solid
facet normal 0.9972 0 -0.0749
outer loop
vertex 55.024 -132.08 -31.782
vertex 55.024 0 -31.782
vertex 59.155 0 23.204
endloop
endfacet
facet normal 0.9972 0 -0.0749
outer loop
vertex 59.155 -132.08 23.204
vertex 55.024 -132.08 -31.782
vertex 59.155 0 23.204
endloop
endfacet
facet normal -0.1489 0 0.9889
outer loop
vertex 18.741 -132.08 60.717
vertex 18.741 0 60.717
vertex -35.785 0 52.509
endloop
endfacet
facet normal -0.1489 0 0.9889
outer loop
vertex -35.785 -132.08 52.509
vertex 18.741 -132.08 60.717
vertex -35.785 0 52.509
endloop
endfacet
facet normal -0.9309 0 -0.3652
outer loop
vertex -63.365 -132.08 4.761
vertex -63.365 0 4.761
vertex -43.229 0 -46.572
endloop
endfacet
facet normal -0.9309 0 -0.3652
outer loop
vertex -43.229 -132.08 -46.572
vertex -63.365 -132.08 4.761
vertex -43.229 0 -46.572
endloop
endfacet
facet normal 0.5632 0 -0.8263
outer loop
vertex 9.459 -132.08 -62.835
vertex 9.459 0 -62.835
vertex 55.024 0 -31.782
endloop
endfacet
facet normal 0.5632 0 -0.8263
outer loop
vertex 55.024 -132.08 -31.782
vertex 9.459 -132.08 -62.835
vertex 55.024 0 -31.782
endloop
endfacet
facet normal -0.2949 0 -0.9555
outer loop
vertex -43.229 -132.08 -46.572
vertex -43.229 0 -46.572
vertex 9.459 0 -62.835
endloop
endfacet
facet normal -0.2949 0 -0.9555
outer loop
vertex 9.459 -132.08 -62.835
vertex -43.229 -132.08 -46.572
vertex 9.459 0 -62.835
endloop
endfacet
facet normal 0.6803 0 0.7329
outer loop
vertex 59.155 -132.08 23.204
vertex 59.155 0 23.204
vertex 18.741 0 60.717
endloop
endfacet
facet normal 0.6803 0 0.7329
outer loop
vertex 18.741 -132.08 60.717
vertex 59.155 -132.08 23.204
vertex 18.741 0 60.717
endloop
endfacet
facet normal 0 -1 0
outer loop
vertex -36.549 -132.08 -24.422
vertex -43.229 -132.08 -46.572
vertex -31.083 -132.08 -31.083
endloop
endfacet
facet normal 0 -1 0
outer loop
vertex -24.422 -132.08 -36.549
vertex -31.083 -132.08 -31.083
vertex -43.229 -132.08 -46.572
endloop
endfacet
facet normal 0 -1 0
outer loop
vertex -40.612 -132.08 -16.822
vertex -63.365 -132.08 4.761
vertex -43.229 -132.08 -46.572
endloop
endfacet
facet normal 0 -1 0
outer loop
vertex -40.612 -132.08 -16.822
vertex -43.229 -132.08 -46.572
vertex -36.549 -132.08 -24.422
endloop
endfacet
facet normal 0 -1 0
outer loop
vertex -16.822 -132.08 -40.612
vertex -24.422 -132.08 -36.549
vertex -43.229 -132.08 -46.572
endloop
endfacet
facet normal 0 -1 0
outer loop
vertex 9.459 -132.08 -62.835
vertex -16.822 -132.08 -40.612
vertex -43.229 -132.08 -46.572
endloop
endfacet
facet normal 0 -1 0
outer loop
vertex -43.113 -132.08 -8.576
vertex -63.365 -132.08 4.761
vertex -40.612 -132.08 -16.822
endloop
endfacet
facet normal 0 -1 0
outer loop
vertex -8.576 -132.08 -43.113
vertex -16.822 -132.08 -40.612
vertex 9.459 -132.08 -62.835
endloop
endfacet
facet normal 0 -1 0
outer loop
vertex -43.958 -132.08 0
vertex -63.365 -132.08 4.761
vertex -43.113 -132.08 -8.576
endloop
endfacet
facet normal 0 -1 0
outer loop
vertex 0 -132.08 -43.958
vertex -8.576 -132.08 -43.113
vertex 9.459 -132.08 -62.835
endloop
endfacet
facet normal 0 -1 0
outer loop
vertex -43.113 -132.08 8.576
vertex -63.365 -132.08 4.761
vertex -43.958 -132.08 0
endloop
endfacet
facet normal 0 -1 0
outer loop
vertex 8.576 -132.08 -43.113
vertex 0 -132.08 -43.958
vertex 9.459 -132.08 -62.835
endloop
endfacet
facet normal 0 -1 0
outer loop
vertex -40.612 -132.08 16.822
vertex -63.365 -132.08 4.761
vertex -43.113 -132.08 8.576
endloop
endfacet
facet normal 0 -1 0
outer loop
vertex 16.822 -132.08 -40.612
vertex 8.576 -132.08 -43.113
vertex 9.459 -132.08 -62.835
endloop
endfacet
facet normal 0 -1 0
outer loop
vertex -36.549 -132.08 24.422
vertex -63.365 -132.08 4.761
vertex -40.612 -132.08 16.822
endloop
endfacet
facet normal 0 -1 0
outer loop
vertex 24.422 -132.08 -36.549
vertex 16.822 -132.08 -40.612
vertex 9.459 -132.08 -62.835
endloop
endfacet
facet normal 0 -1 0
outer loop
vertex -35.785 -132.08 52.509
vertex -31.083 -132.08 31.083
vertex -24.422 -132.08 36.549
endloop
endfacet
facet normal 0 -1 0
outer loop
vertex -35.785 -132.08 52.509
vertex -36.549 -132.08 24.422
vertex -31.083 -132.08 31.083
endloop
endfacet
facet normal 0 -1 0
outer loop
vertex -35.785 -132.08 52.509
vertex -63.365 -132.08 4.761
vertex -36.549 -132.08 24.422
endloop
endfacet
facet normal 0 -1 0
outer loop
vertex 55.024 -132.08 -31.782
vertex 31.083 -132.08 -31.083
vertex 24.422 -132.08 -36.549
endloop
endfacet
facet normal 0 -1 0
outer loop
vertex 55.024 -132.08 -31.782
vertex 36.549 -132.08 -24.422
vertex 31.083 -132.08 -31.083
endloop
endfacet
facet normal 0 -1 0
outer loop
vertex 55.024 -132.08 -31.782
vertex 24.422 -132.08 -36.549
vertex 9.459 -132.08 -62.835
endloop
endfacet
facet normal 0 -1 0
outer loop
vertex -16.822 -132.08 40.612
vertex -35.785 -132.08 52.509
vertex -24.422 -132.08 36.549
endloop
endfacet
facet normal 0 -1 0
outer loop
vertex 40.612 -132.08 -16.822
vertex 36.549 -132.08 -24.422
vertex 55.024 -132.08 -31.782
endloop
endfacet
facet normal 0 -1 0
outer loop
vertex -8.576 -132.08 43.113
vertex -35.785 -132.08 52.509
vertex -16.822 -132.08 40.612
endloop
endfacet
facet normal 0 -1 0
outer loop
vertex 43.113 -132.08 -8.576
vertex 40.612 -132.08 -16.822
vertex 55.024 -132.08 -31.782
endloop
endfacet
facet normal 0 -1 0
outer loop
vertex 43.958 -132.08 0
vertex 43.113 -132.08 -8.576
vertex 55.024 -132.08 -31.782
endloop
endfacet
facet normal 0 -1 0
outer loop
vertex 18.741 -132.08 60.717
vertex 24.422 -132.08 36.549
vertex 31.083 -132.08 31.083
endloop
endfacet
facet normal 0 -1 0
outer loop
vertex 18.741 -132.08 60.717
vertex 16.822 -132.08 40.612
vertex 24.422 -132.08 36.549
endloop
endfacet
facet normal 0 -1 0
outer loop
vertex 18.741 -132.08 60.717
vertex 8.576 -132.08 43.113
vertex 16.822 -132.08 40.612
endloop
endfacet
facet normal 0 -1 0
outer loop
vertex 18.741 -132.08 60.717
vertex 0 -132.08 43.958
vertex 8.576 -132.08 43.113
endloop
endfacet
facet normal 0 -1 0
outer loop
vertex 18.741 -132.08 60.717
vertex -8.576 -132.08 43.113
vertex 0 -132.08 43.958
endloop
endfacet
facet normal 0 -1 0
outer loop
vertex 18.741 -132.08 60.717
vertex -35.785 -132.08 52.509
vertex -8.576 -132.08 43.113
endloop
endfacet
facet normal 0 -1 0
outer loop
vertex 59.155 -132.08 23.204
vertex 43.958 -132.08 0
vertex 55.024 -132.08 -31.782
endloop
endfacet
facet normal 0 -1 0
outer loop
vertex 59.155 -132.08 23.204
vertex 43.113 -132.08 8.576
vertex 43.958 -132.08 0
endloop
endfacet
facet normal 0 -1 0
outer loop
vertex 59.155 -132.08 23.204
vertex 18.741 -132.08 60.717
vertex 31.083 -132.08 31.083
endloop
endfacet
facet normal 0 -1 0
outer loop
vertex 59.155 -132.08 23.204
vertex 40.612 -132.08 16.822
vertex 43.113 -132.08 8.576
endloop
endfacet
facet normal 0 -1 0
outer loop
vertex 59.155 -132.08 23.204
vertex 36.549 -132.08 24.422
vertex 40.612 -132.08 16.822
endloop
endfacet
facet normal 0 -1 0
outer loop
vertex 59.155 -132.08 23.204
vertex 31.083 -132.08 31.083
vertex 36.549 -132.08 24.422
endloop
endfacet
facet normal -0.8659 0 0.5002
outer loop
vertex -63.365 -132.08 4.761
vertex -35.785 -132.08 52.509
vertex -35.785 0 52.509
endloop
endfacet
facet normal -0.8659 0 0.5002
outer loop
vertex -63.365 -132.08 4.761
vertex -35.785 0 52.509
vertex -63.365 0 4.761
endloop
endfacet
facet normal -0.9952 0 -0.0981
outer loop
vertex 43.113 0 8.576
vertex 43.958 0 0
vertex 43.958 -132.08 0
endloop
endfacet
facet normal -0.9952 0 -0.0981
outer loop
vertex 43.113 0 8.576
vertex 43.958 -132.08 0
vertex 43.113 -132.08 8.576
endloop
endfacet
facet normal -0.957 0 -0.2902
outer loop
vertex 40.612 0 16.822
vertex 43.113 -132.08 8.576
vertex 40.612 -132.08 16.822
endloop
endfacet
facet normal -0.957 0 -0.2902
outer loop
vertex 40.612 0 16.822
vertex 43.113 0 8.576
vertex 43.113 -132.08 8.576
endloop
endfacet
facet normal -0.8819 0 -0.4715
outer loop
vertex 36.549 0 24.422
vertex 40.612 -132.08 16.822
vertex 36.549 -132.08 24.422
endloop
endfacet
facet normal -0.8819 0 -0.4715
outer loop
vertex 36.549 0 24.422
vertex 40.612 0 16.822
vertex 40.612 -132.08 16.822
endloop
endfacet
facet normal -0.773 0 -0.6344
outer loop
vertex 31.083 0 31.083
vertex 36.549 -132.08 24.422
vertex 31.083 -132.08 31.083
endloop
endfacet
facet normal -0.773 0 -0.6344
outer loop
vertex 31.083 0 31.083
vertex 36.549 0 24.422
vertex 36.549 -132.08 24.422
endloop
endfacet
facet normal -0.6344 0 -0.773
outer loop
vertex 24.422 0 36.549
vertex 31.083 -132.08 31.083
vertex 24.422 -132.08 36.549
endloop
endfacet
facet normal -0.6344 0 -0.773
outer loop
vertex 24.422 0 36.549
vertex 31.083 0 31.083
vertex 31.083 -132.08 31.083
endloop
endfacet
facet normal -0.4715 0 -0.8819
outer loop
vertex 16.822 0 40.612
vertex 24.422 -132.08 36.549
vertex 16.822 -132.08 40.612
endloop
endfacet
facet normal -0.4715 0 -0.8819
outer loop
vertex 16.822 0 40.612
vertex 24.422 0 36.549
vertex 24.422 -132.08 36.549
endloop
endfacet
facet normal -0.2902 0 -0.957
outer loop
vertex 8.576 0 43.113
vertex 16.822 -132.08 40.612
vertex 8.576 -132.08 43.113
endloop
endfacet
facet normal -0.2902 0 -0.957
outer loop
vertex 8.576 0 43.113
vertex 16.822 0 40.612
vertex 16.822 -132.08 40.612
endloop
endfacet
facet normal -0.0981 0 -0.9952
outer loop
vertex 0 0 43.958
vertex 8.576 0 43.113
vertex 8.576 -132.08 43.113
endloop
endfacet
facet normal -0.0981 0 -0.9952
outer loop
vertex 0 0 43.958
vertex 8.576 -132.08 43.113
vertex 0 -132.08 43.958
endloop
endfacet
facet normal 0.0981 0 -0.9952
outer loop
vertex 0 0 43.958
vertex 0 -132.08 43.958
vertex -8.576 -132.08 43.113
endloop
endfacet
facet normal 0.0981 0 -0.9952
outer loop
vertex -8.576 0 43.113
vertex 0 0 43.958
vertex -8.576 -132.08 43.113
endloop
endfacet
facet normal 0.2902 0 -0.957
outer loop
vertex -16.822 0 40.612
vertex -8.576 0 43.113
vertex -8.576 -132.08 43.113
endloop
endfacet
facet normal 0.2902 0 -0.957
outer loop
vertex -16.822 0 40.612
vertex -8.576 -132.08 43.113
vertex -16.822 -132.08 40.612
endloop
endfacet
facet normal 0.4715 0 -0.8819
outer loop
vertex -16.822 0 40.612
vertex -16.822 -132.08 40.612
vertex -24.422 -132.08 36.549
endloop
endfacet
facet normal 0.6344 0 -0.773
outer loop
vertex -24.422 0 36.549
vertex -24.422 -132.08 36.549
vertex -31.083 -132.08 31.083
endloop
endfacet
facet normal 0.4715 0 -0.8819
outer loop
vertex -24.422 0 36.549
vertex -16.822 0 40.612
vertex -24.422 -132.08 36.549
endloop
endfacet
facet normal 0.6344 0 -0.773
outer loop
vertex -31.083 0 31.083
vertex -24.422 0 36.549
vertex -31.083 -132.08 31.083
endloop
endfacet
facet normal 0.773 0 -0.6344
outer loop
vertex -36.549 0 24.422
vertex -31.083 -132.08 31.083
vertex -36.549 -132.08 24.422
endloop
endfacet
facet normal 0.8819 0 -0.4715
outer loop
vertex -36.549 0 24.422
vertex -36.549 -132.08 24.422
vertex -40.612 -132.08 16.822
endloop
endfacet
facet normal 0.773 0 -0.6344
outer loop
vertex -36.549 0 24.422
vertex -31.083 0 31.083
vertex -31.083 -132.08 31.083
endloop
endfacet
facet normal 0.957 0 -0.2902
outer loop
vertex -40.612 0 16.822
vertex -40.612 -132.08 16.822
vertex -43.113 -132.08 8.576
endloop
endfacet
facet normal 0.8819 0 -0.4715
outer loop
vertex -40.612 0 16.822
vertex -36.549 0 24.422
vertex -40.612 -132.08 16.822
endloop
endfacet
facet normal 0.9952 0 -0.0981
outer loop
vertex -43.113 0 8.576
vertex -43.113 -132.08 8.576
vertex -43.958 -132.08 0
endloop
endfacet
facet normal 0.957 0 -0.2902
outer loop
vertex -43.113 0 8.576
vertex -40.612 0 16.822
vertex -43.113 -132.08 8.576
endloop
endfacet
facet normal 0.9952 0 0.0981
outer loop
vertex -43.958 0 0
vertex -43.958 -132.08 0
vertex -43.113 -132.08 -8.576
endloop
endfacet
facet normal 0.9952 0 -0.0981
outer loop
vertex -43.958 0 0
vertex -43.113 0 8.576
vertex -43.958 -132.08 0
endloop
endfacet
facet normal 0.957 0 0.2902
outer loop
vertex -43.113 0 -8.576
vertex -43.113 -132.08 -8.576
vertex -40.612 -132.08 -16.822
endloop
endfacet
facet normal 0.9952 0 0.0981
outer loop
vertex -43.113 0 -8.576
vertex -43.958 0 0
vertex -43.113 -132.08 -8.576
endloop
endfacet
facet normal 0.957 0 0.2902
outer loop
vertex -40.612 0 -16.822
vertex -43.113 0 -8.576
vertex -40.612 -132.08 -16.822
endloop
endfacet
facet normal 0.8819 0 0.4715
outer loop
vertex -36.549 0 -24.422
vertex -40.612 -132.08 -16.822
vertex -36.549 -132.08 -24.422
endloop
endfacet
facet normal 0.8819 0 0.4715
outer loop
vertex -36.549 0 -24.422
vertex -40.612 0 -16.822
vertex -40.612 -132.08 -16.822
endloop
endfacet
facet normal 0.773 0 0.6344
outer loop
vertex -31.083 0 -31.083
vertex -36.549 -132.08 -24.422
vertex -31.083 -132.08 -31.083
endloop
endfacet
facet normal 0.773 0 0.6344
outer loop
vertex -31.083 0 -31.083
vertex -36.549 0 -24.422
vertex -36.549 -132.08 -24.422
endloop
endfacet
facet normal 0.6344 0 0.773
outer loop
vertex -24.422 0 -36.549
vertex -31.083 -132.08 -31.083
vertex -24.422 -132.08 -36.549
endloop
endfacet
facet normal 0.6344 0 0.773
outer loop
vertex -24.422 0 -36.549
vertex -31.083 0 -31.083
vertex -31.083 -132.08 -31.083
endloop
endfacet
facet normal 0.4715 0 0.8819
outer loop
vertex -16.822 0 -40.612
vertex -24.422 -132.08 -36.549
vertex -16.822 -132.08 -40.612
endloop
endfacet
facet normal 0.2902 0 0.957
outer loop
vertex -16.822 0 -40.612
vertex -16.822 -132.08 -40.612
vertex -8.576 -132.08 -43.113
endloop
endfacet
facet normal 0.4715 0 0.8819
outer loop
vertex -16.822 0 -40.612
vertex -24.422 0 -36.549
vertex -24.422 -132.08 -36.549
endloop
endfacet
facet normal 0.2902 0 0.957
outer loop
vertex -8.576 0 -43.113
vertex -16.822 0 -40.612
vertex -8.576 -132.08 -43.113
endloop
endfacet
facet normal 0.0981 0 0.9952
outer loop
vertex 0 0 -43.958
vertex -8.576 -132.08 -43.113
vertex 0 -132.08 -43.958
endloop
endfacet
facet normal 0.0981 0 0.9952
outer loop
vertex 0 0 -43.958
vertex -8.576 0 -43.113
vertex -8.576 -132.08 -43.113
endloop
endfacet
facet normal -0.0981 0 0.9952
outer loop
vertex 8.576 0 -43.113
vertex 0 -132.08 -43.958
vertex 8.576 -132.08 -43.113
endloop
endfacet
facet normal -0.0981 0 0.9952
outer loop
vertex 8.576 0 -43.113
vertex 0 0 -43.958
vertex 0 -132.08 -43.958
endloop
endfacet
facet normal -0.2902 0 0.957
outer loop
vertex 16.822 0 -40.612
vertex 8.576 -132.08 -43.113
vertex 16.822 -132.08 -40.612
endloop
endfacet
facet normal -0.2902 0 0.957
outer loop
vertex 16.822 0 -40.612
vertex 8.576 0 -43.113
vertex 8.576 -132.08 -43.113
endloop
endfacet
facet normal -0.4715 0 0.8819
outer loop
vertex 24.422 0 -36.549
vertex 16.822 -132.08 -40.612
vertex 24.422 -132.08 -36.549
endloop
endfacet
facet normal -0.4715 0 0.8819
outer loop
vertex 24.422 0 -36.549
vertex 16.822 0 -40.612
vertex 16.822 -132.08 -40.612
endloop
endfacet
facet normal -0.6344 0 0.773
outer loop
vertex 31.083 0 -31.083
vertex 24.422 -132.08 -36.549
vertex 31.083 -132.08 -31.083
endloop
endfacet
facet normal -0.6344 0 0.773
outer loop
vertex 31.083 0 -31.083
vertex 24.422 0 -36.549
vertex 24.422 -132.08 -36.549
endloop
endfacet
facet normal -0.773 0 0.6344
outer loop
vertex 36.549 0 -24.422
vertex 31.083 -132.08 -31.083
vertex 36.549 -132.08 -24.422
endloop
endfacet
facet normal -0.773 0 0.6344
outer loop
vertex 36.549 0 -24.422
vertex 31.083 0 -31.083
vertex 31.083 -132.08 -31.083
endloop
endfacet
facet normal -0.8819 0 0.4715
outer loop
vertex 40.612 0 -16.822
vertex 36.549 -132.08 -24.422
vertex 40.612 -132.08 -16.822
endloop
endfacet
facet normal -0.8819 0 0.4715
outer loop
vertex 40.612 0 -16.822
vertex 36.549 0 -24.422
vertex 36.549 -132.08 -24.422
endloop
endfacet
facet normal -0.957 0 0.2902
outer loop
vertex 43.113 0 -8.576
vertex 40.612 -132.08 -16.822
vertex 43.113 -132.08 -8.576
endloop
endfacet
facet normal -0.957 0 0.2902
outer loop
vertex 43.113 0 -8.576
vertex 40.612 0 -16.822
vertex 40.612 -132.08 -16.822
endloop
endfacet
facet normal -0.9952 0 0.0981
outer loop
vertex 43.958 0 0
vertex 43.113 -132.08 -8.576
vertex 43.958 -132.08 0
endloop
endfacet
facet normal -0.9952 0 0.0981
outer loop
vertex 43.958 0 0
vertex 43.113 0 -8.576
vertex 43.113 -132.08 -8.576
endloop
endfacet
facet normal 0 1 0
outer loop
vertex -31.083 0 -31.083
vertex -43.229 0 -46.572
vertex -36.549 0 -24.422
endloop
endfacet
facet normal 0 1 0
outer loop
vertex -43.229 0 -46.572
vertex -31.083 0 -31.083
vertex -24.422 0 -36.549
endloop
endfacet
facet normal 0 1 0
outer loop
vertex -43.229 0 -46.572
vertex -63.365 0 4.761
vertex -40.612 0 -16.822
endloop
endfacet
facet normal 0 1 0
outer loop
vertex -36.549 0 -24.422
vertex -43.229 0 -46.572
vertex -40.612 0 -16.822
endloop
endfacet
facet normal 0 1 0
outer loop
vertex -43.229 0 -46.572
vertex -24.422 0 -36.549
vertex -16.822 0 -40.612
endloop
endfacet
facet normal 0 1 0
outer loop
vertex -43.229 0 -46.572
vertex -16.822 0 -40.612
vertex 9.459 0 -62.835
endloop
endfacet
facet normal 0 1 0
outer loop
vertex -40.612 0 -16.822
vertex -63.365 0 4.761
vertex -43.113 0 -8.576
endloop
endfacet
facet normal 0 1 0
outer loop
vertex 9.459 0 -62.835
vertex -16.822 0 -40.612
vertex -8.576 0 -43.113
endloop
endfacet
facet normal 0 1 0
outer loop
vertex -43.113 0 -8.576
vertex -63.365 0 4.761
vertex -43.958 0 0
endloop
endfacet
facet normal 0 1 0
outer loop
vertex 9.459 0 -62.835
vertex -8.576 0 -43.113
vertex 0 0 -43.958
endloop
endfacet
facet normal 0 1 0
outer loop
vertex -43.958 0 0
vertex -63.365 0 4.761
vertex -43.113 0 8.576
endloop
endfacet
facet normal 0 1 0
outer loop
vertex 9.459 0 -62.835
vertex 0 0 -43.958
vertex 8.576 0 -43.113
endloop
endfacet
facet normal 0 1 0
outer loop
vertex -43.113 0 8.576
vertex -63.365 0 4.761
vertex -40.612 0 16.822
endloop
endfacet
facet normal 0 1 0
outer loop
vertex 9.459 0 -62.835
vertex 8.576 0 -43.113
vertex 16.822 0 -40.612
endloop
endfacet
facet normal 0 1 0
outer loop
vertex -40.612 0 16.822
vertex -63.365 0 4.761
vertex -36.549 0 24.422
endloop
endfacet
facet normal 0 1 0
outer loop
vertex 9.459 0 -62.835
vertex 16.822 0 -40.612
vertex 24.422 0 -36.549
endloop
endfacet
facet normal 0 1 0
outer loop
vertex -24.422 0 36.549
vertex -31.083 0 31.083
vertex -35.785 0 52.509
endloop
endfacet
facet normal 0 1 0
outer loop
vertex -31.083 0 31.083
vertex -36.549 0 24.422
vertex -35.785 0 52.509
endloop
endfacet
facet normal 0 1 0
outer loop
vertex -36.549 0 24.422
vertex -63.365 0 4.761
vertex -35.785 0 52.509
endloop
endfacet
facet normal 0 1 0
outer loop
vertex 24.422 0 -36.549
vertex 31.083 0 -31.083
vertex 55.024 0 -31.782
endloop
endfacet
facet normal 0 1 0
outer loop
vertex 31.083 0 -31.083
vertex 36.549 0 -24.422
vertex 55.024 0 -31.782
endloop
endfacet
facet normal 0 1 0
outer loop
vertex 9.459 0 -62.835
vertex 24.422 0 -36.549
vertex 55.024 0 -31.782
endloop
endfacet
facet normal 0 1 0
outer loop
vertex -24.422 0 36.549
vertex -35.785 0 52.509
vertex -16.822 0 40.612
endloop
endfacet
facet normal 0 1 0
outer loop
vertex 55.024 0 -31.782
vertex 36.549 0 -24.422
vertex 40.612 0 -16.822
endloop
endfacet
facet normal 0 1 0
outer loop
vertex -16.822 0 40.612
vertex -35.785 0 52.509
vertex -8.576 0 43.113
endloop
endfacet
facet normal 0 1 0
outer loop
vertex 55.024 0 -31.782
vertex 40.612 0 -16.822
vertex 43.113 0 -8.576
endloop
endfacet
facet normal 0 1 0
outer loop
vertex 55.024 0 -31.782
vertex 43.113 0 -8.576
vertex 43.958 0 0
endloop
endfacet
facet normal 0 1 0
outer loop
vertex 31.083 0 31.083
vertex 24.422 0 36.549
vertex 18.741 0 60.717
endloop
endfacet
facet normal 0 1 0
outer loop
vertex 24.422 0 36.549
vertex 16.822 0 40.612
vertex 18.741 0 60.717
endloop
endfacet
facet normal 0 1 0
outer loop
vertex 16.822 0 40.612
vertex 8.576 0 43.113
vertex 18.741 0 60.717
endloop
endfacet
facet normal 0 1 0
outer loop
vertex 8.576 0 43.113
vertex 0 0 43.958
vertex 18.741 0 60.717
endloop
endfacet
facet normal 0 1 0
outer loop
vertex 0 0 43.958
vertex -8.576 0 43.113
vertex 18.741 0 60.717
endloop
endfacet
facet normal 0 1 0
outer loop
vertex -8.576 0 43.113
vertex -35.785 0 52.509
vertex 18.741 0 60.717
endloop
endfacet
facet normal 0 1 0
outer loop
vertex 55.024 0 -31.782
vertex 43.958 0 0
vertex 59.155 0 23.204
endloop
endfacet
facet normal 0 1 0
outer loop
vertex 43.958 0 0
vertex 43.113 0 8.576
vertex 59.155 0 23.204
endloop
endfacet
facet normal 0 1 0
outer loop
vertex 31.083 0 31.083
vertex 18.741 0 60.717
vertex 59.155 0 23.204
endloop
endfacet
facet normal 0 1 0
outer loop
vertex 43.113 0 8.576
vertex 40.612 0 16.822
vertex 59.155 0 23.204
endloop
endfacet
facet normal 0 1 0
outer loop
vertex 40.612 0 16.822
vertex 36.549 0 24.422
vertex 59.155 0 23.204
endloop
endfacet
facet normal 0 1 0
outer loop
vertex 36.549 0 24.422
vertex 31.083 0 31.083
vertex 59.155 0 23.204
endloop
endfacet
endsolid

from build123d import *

# Parameters (mm, degrees)
F0_R     = 43.957612
F1_DEPTH = 132.08


with BuildPart() as f1:
    # F0 (on Front) → F1 (new body)
    with BuildSketch(Plane.XZ):
        Polygon((-35.785236, 52.508596), (-63.364603, 4.76055), (-43.229131, -46.572287), (9.458758, -62.835242), (55.024009, -31.781978), (59.155059, 23.203763), (18.741144, 60.716598), align=None)
        Circle(F0_R, mode=Mode.SUBTRACT)
    extrude(amount=F1_DEPTH)


solid = f1.part
